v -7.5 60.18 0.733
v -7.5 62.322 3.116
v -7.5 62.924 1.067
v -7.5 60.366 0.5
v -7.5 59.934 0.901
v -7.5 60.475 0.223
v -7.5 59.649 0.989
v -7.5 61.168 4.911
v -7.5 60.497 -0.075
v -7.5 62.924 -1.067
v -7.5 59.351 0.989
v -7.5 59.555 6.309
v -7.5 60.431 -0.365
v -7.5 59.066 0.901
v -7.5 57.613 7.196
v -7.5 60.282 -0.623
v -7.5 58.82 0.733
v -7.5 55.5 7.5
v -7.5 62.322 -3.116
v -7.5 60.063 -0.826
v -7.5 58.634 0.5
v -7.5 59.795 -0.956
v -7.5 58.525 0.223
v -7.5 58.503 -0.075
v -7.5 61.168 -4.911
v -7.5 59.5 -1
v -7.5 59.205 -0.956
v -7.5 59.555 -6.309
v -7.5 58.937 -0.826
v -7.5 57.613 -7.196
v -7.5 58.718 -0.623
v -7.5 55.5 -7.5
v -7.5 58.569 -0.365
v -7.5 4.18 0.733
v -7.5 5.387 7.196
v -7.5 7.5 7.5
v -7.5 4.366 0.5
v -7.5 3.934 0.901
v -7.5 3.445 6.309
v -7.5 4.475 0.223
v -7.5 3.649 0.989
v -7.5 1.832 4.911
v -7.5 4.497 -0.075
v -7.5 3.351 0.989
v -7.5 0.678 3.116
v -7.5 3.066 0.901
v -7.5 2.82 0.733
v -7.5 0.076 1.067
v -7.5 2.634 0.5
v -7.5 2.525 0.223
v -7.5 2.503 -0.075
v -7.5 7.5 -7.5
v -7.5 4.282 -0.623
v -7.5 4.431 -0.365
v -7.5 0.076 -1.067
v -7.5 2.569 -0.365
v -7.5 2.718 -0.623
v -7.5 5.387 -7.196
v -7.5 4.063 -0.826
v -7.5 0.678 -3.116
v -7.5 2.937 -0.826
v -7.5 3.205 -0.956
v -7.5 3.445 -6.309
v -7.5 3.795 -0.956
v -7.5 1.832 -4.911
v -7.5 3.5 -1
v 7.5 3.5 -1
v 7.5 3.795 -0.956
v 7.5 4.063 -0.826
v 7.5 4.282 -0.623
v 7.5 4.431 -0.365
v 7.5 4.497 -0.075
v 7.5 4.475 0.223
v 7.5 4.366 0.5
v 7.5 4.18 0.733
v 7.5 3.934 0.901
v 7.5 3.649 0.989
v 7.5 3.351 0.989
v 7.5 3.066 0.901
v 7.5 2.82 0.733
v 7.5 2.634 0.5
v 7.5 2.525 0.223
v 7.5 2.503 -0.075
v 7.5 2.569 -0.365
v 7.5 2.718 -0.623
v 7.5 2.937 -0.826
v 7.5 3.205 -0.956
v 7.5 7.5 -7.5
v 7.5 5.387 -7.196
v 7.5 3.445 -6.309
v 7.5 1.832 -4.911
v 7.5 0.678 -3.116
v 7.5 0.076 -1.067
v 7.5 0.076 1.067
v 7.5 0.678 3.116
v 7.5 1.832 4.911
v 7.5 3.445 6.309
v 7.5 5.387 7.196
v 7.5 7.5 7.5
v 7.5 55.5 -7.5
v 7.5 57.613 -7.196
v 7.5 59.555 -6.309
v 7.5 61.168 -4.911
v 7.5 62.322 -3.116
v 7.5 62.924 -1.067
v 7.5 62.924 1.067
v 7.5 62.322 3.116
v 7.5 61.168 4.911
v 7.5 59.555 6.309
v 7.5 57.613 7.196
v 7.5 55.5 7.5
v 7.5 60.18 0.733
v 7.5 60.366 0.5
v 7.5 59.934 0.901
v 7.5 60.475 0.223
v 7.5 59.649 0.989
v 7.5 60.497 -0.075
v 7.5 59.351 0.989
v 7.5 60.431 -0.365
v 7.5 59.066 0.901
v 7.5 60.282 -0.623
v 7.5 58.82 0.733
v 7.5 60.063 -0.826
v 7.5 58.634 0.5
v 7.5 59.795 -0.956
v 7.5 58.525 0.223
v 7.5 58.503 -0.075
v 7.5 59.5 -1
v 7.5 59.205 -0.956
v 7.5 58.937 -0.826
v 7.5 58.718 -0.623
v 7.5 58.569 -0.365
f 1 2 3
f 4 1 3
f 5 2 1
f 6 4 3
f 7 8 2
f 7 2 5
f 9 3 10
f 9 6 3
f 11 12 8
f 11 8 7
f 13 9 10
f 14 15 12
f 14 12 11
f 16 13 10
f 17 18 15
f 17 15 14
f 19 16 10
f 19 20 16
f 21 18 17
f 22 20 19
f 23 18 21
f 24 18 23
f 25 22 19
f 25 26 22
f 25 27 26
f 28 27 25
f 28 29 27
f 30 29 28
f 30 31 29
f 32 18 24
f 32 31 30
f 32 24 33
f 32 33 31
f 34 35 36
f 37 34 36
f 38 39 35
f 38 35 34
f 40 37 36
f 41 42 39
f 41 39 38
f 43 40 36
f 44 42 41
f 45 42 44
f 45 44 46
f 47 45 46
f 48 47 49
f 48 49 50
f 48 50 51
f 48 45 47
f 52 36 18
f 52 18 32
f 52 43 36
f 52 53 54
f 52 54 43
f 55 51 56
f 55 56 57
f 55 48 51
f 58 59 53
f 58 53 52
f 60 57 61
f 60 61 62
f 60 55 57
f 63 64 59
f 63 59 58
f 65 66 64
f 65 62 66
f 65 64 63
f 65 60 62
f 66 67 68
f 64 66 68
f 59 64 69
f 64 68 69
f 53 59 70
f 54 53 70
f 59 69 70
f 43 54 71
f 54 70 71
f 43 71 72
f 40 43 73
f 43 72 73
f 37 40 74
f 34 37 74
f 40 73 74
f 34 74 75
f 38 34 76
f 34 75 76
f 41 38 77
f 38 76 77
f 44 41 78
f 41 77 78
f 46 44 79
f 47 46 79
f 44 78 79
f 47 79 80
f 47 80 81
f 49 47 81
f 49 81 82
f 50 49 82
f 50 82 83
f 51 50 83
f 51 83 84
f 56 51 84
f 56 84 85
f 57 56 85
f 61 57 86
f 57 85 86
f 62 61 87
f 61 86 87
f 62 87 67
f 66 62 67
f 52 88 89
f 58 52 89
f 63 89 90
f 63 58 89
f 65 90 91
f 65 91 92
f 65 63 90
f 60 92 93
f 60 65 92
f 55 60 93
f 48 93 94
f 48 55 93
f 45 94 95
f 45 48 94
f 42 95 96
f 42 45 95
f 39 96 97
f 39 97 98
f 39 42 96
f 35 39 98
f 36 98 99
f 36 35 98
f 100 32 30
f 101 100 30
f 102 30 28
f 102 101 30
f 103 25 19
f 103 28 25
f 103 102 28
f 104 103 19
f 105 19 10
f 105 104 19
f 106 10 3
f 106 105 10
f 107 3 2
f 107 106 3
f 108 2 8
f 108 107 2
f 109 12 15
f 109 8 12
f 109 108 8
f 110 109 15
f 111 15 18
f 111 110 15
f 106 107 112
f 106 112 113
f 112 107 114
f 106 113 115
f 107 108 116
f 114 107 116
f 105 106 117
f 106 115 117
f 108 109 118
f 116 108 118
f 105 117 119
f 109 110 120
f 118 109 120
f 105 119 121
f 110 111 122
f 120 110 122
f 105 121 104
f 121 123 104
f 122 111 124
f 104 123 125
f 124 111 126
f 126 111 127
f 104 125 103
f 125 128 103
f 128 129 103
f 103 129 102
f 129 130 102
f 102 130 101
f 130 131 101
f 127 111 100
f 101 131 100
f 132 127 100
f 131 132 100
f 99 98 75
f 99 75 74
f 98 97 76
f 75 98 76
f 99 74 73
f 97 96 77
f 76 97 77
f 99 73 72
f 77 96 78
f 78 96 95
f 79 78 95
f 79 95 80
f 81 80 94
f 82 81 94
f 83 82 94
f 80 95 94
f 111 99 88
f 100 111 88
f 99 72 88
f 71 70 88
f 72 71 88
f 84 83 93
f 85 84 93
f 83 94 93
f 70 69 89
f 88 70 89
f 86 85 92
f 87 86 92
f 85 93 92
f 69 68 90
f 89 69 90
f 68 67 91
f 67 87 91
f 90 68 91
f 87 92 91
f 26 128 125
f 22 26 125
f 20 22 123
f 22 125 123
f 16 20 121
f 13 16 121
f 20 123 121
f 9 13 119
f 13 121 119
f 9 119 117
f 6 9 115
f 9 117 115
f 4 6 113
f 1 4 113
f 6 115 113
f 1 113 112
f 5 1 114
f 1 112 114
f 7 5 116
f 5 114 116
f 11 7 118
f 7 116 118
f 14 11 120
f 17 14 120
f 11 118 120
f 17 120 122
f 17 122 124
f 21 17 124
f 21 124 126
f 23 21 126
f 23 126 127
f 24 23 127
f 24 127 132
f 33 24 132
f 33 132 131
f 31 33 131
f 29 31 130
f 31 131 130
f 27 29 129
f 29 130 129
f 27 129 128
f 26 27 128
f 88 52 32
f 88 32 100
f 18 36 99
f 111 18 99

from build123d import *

# Parameters (mm, degrees)
SKETCH1_W           = 15
SKETCH1_H           = 15
BOSS_EXTRUDE1_DEPTH = 63
SKETCH3_R           = 1
CUT_EXTRUDE1_DEPTH  = 15
FILLET1_RADIUS      = 7.5
FILLET1_LENGTH      = 15
FILLET2_RADIUS      = 7.5
FILLET2_LENGTH      = 15


with BuildPart() as part:
    # Sketch1 → Boss-Extrude1 (new body)
    with BuildSketch(Plane(origin=(0, 0, 0), x_dir=(1, 0, 0), z_dir=(0, 1, 0))):
        Rectangle(SKETCH1_W, SKETCH1_H)
    extrude(amount=BOSS_EXTRUDE1_DEPTH)

    # Sketch3 → Cut-Extrude1 (cut)
    with BuildSketch(Plane(origin=(7.5, 0, 0), x_dir=(0, 0, -1), z_dir=(1, 0, 0))):
        with Locations((0, 59.5)):
            Circle(SKETCH3_R)
        with Locations((0, 3.5)):
            Circle(SKETCH3_R)
    extrude(amount=-CUT_EXTRUDE1_DEPTH, mode=Mode.SUBTRACT)

    # Fillet1: full round fillet: the end face becomes a half cylinder, R = half its width
    fillet1_face = Plane((0, 63, 0), x_dir=(1, 0, 0), z_dir=(0, 1, 0))  # on the end face: x along it, z out of the body
    fillet1_slab = fillet1_face.offset(-FILLET1_RADIUS / 2) * Box(FILLET1_LENGTH, 2 * FILLET1_RADIUS, FILLET1_RADIUS, mode=Mode.PRIVATE)  # the body's end, R deep
    fillet1_round = Plane((0, 55.5, 0), x_dir=(0, 1, 0), z_dir=(1, 0, 0)) * Cylinder(FILLET1_RADIUS, FILLET1_LENGTH, mode=Mode.PRIVATE)  # its axis R under the face
    add(fillet1_slab - fillet1_round, mode=Mode.SUBTRACT)

    # Fillet2: full round fillet: the end face becomes a half cylinder, R = half its width
    fillet2_face = Plane((0, 0, 0), x_dir=(-1, 0, 0), z_dir=(0, -1, 0))  # on the end face: x along it, z out of the body
    fillet2_slab = fillet2_face.offset(-FILLET2_RADIUS / 2) * Box(FILLET2_LENGTH, 2 * FILLET2_RADIUS, FILLET2_RADIUS, mode=Mode.PRIVATE)  # the body's end, R deep
    fillet2_round = Plane((0, 7.5, 0), x_dir=(0, -1, 0), z_dir=(-1, 0, 0)) * Cylinder(FILLET2_RADIUS, FILLET2_LENGTH, mode=Mode.PRIVATE)  # its axis R under the face
    add(fillet2_slab - fillet2_round, mode=Mode.SUBTRACT)


solid = part.part
